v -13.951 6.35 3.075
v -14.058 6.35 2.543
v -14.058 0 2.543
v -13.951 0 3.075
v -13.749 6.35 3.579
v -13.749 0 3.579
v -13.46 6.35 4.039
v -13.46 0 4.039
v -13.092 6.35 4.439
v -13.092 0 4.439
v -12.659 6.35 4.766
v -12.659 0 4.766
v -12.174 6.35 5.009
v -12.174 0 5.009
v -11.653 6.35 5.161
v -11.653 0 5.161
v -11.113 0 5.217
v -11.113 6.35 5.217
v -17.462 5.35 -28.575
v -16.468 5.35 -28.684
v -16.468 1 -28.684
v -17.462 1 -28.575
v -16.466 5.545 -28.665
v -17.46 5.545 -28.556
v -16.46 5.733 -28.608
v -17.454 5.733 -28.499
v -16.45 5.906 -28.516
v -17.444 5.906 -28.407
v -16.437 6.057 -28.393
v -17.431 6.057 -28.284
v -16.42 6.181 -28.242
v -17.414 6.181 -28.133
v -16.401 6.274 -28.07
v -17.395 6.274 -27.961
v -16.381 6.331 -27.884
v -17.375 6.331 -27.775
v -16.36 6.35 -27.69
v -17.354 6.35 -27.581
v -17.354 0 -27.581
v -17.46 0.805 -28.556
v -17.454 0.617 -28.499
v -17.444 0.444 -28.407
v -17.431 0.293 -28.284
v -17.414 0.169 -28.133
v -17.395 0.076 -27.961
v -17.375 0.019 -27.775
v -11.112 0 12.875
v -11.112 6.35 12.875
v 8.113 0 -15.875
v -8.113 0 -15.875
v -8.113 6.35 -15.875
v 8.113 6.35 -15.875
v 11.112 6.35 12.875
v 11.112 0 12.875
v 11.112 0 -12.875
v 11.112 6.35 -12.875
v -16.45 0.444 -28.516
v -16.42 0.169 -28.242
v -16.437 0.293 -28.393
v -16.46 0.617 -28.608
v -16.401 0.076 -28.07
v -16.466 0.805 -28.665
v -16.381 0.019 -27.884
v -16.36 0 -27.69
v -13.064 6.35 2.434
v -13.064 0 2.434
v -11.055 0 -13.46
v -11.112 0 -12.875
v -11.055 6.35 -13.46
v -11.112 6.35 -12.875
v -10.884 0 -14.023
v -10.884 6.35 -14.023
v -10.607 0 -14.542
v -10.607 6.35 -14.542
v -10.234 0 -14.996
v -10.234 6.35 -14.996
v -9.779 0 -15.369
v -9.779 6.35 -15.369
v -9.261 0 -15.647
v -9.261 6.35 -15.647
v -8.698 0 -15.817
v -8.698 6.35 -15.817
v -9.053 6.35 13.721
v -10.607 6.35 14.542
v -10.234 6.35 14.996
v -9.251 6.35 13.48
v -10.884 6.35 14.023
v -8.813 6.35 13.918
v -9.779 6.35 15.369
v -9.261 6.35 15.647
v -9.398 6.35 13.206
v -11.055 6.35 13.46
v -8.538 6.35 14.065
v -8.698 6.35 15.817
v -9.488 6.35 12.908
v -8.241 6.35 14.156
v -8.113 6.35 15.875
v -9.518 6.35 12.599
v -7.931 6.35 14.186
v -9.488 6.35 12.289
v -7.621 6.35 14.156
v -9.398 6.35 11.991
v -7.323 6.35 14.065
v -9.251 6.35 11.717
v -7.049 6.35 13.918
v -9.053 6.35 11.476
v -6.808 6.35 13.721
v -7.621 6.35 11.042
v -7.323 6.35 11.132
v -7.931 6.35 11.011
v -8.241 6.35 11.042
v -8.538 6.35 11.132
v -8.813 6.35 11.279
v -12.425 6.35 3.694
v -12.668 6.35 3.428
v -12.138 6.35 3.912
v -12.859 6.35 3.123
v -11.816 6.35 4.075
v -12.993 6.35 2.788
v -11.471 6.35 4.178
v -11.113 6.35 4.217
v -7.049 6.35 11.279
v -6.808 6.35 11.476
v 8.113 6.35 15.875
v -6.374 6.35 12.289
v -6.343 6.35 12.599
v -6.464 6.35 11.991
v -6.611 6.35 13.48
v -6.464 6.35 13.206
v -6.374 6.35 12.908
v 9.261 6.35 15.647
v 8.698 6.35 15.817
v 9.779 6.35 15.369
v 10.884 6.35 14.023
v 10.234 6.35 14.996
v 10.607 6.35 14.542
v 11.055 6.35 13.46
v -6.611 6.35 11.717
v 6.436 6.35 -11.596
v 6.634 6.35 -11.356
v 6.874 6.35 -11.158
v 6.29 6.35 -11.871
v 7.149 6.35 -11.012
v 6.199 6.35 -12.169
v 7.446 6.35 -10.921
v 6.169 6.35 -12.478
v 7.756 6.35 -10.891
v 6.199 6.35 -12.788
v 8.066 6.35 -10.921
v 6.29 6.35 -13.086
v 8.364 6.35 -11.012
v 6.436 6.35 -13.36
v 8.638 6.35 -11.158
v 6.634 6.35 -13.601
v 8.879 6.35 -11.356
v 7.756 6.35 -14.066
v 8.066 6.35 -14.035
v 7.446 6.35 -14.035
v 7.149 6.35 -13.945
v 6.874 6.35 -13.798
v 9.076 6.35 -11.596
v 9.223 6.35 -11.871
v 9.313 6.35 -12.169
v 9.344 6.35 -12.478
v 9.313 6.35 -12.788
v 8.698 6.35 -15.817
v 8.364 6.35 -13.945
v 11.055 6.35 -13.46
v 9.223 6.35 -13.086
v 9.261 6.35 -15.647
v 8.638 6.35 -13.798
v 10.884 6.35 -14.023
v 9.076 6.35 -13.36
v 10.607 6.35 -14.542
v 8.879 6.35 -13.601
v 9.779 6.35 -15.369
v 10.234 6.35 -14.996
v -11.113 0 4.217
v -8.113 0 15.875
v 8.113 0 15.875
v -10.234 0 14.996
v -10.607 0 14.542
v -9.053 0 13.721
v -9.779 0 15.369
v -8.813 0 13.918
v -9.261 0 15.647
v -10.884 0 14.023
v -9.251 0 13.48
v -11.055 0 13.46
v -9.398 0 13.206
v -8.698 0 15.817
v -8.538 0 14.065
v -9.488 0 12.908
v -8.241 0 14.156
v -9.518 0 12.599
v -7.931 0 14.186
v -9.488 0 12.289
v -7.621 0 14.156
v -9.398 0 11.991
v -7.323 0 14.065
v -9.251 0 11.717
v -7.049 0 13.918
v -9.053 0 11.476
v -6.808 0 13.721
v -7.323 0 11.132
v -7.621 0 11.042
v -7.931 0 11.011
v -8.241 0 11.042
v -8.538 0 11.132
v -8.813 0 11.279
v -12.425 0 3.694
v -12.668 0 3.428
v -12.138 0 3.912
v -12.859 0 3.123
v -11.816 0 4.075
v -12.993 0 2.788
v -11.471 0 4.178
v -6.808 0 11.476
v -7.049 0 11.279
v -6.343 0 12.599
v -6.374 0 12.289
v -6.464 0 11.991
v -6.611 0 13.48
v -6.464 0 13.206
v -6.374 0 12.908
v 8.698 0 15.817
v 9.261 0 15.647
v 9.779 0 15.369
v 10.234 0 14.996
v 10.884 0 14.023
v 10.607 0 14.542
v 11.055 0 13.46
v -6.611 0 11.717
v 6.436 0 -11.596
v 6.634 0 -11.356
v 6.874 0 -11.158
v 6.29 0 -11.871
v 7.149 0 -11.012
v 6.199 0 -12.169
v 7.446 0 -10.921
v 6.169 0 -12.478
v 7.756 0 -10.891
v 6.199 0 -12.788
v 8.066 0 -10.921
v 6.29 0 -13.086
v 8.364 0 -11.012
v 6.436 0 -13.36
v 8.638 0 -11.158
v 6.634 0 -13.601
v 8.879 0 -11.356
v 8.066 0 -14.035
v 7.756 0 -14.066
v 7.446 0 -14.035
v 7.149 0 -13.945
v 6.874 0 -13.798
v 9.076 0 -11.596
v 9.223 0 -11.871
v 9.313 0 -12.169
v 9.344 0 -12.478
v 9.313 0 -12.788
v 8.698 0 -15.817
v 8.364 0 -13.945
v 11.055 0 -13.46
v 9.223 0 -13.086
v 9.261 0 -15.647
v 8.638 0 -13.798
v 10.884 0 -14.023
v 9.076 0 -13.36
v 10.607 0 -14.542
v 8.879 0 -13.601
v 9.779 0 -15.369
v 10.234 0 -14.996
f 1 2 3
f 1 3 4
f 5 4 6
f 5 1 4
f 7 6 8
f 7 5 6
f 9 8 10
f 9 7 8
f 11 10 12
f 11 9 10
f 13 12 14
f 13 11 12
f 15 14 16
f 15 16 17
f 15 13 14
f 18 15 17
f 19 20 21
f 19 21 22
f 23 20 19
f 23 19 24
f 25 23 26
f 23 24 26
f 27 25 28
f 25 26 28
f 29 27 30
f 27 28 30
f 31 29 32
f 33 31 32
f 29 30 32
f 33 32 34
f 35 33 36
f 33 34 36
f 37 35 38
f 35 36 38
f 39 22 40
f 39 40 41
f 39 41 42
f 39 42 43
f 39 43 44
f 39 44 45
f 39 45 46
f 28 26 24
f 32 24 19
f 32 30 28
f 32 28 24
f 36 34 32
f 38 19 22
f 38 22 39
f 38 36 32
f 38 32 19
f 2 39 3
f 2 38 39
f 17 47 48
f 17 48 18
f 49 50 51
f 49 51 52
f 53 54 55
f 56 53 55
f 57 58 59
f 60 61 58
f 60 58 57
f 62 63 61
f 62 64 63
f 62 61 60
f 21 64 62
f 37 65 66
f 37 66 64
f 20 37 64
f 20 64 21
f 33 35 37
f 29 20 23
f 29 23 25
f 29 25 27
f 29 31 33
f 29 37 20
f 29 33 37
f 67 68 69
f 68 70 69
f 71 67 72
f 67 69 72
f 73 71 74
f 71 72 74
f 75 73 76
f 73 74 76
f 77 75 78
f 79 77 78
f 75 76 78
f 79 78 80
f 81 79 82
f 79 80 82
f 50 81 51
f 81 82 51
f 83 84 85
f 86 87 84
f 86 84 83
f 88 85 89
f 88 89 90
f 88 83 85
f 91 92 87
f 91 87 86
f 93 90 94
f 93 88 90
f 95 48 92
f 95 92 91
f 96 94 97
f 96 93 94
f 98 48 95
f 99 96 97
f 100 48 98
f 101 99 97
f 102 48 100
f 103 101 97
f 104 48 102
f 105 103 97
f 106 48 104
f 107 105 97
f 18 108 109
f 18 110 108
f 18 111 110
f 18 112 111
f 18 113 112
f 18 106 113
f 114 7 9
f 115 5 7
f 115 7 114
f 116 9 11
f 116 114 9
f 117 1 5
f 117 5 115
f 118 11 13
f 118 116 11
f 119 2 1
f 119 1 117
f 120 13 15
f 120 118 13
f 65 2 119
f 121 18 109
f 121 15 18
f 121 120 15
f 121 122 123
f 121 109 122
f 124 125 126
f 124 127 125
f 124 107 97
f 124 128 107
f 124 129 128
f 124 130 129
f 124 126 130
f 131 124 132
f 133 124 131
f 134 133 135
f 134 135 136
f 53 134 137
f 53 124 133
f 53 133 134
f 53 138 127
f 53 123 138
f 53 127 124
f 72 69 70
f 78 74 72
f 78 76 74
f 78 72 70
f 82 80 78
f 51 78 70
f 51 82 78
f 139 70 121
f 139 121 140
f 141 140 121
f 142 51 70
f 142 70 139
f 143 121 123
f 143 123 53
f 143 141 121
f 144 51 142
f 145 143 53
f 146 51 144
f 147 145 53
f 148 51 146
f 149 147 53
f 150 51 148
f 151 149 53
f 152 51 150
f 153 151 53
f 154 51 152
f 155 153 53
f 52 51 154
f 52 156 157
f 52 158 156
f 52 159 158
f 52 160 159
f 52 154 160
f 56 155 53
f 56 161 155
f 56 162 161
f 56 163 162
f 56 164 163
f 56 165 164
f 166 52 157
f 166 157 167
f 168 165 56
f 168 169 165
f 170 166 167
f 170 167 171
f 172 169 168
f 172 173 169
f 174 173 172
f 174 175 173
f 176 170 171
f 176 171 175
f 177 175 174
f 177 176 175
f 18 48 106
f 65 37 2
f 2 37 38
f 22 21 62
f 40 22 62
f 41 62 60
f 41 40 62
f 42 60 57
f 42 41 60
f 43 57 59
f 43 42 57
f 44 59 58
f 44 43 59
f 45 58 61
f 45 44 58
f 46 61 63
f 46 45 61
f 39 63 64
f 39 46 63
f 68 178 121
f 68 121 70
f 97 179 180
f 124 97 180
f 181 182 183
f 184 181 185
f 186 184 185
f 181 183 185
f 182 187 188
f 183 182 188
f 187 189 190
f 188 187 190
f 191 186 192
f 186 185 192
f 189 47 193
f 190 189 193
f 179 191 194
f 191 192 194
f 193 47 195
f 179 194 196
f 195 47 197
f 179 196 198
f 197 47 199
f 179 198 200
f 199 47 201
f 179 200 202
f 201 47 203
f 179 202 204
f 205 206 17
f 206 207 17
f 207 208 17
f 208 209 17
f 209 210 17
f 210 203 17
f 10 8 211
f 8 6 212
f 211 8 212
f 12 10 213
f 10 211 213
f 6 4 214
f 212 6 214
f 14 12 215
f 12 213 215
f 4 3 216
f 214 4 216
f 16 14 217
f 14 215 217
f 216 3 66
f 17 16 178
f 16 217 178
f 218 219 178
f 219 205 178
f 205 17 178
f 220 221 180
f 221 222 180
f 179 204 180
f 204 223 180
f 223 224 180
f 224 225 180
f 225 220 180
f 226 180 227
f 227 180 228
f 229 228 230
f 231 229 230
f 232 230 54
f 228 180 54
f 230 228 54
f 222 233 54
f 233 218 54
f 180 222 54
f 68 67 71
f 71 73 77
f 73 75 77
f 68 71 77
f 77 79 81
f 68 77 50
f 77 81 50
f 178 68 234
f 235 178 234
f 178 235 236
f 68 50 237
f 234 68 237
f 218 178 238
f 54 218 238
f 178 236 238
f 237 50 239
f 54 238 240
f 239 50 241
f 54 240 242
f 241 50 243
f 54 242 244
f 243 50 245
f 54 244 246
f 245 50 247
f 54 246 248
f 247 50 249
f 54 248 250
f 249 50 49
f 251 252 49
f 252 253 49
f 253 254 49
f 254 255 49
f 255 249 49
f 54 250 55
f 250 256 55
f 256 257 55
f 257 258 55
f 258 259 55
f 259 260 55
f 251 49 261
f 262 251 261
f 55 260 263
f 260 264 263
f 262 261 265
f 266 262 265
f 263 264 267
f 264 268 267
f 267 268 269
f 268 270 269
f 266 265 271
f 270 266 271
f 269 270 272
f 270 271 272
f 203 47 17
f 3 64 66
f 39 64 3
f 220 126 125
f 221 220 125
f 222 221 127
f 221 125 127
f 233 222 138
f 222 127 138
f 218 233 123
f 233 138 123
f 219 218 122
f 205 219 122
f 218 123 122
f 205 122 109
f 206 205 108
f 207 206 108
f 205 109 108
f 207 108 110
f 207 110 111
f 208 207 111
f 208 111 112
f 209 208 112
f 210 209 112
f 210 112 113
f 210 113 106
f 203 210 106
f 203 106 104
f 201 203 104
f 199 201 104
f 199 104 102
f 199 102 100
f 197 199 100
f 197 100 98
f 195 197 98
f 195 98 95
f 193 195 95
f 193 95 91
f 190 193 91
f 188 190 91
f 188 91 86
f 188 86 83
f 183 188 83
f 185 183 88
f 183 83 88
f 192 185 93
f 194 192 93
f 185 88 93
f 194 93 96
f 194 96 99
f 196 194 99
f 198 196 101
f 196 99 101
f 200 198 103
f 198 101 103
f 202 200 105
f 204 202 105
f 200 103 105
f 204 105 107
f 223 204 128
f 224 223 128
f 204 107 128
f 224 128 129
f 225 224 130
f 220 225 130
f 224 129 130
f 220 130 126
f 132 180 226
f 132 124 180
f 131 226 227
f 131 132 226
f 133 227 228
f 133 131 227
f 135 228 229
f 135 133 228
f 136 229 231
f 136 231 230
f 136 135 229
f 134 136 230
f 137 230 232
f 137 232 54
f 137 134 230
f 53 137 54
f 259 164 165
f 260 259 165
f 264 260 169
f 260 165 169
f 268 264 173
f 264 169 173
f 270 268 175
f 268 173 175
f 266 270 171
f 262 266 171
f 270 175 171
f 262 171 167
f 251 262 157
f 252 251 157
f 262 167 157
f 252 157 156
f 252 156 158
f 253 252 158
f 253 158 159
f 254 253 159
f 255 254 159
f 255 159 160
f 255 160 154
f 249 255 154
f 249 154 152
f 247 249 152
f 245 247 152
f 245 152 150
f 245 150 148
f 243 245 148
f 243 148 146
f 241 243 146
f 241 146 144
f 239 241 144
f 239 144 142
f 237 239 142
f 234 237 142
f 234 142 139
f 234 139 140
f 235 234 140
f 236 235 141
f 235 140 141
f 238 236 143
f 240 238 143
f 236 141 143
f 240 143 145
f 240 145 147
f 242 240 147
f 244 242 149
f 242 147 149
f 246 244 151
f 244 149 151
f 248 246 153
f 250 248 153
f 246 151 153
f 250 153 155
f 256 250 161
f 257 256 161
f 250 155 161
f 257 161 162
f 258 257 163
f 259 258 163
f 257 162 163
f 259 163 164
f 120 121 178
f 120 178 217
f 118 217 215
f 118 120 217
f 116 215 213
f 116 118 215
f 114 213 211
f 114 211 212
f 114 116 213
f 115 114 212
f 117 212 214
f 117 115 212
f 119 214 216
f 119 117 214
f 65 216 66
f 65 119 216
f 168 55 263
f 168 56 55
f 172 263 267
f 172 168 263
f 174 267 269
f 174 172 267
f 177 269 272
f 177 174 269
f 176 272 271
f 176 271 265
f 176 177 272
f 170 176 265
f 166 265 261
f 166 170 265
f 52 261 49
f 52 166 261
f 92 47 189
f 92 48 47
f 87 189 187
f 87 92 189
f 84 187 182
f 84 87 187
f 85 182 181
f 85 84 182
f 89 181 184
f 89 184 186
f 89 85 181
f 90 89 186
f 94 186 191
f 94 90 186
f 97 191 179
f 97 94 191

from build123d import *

# Parameters (mm, degrees)
SKETCH1_W           = 22.225
SKETCH1_H           = 31.75
BOSS_EXTRUDE1_DEPTH = 6.35
FILLET1_R           = 3
BOSS_EXTRUDE2_DEPTH = 6.35
FILLET2_R           = 1
SKETCH3_R           = 1.5875
CUT_EXTRUDE1_DEPTH  = 16.35


with BuildPart() as part:
    # Sketch1 → Boss-Extrude1 (new body)
    with BuildSketch(Plane(origin=(0, 0, 0), x_dir=(1, 0, 0), z_dir=(0, 1, 0))):
        Rectangle(SKETCH1_W, SKETCH1_H)
    extrude(amount=BOSS_EXTRUDE1_DEPTH)

    # Fillet1
    fillet1_edges = [part.edges().sort_by_distance(p)[0] for p in [
        (11.1125, 3.175, 15.875),
        (-11.1125, 3.175, 15.875),
        (-11.1125, 3.175, -15.875),
        (11.1125, 3.175, -15.875),
    ]]
    fillet(fillet1_edges, radius=FILLET1_R)

    # Sketch2 → Boss-Extrude2 (add)
    with BuildSketch(Plane(origin=(0, 6.35, 0), x_dir=(1, 0, 0), z_dir=(0, 1, 0))):
        with BuildLine():
            Line((-17.4625, 28.575), (-14.058436423, -2.543223758))
            ThreePointArc((-14.058436423, -2.543223758), (-13.078889385, -4.450679351), (-11.076226608, -5.21699589))
            Line((-11.076226608, -5.21699589), (-6.223943536, -5.21699589))
            Line((-6.223943536, -5.21699589), (-6.223943536, -4.21699589))
            Line((-6.223943536, -4.21699589), (-11.076226608, -4.21699589))
            ThreePointArc((-11.076226608, -4.21699589), (-12.411335126, -3.706118197), (-13.064366485, -2.434481136))
            Line((-13.064366485, -2.434481136), (-16.468430062, 28.683742623))
            Line((-16.468430062, 28.683742623), (-17.4625, 28.575))
        make_face()
    extrude(amount=-BOSS_EXTRUDE2_DEPTH)

    # Fillet2
    fillet2_edges = [part.edges().sort_by_distance(p)[0] for p in [
        (-16.965465031, 6.35, -28.629371311),
        (-16.965465031, 0, -28.629371311),
    ]]
    fillet(fillet2_edges, radius=FILLET2_R)

    # Sketch3 → Cut-Extrude1 (cut)
    with BuildSketch(Plane(origin=(0, 6.35, 0), x_dir=(1, 0, 0), z_dir=(0, 1, 0))):
        with Locations((7.756160145, 12.478354906)):
            Circle(SKETCH3_R)
        with Locations((-7.930929808, -12.598511213)):
            Circle(SKETCH3_R)
    extrude(amount=-CUT_EXTRUDE1_DEPTH, mode=Mode.SUBTRACT)


solid = part.part
